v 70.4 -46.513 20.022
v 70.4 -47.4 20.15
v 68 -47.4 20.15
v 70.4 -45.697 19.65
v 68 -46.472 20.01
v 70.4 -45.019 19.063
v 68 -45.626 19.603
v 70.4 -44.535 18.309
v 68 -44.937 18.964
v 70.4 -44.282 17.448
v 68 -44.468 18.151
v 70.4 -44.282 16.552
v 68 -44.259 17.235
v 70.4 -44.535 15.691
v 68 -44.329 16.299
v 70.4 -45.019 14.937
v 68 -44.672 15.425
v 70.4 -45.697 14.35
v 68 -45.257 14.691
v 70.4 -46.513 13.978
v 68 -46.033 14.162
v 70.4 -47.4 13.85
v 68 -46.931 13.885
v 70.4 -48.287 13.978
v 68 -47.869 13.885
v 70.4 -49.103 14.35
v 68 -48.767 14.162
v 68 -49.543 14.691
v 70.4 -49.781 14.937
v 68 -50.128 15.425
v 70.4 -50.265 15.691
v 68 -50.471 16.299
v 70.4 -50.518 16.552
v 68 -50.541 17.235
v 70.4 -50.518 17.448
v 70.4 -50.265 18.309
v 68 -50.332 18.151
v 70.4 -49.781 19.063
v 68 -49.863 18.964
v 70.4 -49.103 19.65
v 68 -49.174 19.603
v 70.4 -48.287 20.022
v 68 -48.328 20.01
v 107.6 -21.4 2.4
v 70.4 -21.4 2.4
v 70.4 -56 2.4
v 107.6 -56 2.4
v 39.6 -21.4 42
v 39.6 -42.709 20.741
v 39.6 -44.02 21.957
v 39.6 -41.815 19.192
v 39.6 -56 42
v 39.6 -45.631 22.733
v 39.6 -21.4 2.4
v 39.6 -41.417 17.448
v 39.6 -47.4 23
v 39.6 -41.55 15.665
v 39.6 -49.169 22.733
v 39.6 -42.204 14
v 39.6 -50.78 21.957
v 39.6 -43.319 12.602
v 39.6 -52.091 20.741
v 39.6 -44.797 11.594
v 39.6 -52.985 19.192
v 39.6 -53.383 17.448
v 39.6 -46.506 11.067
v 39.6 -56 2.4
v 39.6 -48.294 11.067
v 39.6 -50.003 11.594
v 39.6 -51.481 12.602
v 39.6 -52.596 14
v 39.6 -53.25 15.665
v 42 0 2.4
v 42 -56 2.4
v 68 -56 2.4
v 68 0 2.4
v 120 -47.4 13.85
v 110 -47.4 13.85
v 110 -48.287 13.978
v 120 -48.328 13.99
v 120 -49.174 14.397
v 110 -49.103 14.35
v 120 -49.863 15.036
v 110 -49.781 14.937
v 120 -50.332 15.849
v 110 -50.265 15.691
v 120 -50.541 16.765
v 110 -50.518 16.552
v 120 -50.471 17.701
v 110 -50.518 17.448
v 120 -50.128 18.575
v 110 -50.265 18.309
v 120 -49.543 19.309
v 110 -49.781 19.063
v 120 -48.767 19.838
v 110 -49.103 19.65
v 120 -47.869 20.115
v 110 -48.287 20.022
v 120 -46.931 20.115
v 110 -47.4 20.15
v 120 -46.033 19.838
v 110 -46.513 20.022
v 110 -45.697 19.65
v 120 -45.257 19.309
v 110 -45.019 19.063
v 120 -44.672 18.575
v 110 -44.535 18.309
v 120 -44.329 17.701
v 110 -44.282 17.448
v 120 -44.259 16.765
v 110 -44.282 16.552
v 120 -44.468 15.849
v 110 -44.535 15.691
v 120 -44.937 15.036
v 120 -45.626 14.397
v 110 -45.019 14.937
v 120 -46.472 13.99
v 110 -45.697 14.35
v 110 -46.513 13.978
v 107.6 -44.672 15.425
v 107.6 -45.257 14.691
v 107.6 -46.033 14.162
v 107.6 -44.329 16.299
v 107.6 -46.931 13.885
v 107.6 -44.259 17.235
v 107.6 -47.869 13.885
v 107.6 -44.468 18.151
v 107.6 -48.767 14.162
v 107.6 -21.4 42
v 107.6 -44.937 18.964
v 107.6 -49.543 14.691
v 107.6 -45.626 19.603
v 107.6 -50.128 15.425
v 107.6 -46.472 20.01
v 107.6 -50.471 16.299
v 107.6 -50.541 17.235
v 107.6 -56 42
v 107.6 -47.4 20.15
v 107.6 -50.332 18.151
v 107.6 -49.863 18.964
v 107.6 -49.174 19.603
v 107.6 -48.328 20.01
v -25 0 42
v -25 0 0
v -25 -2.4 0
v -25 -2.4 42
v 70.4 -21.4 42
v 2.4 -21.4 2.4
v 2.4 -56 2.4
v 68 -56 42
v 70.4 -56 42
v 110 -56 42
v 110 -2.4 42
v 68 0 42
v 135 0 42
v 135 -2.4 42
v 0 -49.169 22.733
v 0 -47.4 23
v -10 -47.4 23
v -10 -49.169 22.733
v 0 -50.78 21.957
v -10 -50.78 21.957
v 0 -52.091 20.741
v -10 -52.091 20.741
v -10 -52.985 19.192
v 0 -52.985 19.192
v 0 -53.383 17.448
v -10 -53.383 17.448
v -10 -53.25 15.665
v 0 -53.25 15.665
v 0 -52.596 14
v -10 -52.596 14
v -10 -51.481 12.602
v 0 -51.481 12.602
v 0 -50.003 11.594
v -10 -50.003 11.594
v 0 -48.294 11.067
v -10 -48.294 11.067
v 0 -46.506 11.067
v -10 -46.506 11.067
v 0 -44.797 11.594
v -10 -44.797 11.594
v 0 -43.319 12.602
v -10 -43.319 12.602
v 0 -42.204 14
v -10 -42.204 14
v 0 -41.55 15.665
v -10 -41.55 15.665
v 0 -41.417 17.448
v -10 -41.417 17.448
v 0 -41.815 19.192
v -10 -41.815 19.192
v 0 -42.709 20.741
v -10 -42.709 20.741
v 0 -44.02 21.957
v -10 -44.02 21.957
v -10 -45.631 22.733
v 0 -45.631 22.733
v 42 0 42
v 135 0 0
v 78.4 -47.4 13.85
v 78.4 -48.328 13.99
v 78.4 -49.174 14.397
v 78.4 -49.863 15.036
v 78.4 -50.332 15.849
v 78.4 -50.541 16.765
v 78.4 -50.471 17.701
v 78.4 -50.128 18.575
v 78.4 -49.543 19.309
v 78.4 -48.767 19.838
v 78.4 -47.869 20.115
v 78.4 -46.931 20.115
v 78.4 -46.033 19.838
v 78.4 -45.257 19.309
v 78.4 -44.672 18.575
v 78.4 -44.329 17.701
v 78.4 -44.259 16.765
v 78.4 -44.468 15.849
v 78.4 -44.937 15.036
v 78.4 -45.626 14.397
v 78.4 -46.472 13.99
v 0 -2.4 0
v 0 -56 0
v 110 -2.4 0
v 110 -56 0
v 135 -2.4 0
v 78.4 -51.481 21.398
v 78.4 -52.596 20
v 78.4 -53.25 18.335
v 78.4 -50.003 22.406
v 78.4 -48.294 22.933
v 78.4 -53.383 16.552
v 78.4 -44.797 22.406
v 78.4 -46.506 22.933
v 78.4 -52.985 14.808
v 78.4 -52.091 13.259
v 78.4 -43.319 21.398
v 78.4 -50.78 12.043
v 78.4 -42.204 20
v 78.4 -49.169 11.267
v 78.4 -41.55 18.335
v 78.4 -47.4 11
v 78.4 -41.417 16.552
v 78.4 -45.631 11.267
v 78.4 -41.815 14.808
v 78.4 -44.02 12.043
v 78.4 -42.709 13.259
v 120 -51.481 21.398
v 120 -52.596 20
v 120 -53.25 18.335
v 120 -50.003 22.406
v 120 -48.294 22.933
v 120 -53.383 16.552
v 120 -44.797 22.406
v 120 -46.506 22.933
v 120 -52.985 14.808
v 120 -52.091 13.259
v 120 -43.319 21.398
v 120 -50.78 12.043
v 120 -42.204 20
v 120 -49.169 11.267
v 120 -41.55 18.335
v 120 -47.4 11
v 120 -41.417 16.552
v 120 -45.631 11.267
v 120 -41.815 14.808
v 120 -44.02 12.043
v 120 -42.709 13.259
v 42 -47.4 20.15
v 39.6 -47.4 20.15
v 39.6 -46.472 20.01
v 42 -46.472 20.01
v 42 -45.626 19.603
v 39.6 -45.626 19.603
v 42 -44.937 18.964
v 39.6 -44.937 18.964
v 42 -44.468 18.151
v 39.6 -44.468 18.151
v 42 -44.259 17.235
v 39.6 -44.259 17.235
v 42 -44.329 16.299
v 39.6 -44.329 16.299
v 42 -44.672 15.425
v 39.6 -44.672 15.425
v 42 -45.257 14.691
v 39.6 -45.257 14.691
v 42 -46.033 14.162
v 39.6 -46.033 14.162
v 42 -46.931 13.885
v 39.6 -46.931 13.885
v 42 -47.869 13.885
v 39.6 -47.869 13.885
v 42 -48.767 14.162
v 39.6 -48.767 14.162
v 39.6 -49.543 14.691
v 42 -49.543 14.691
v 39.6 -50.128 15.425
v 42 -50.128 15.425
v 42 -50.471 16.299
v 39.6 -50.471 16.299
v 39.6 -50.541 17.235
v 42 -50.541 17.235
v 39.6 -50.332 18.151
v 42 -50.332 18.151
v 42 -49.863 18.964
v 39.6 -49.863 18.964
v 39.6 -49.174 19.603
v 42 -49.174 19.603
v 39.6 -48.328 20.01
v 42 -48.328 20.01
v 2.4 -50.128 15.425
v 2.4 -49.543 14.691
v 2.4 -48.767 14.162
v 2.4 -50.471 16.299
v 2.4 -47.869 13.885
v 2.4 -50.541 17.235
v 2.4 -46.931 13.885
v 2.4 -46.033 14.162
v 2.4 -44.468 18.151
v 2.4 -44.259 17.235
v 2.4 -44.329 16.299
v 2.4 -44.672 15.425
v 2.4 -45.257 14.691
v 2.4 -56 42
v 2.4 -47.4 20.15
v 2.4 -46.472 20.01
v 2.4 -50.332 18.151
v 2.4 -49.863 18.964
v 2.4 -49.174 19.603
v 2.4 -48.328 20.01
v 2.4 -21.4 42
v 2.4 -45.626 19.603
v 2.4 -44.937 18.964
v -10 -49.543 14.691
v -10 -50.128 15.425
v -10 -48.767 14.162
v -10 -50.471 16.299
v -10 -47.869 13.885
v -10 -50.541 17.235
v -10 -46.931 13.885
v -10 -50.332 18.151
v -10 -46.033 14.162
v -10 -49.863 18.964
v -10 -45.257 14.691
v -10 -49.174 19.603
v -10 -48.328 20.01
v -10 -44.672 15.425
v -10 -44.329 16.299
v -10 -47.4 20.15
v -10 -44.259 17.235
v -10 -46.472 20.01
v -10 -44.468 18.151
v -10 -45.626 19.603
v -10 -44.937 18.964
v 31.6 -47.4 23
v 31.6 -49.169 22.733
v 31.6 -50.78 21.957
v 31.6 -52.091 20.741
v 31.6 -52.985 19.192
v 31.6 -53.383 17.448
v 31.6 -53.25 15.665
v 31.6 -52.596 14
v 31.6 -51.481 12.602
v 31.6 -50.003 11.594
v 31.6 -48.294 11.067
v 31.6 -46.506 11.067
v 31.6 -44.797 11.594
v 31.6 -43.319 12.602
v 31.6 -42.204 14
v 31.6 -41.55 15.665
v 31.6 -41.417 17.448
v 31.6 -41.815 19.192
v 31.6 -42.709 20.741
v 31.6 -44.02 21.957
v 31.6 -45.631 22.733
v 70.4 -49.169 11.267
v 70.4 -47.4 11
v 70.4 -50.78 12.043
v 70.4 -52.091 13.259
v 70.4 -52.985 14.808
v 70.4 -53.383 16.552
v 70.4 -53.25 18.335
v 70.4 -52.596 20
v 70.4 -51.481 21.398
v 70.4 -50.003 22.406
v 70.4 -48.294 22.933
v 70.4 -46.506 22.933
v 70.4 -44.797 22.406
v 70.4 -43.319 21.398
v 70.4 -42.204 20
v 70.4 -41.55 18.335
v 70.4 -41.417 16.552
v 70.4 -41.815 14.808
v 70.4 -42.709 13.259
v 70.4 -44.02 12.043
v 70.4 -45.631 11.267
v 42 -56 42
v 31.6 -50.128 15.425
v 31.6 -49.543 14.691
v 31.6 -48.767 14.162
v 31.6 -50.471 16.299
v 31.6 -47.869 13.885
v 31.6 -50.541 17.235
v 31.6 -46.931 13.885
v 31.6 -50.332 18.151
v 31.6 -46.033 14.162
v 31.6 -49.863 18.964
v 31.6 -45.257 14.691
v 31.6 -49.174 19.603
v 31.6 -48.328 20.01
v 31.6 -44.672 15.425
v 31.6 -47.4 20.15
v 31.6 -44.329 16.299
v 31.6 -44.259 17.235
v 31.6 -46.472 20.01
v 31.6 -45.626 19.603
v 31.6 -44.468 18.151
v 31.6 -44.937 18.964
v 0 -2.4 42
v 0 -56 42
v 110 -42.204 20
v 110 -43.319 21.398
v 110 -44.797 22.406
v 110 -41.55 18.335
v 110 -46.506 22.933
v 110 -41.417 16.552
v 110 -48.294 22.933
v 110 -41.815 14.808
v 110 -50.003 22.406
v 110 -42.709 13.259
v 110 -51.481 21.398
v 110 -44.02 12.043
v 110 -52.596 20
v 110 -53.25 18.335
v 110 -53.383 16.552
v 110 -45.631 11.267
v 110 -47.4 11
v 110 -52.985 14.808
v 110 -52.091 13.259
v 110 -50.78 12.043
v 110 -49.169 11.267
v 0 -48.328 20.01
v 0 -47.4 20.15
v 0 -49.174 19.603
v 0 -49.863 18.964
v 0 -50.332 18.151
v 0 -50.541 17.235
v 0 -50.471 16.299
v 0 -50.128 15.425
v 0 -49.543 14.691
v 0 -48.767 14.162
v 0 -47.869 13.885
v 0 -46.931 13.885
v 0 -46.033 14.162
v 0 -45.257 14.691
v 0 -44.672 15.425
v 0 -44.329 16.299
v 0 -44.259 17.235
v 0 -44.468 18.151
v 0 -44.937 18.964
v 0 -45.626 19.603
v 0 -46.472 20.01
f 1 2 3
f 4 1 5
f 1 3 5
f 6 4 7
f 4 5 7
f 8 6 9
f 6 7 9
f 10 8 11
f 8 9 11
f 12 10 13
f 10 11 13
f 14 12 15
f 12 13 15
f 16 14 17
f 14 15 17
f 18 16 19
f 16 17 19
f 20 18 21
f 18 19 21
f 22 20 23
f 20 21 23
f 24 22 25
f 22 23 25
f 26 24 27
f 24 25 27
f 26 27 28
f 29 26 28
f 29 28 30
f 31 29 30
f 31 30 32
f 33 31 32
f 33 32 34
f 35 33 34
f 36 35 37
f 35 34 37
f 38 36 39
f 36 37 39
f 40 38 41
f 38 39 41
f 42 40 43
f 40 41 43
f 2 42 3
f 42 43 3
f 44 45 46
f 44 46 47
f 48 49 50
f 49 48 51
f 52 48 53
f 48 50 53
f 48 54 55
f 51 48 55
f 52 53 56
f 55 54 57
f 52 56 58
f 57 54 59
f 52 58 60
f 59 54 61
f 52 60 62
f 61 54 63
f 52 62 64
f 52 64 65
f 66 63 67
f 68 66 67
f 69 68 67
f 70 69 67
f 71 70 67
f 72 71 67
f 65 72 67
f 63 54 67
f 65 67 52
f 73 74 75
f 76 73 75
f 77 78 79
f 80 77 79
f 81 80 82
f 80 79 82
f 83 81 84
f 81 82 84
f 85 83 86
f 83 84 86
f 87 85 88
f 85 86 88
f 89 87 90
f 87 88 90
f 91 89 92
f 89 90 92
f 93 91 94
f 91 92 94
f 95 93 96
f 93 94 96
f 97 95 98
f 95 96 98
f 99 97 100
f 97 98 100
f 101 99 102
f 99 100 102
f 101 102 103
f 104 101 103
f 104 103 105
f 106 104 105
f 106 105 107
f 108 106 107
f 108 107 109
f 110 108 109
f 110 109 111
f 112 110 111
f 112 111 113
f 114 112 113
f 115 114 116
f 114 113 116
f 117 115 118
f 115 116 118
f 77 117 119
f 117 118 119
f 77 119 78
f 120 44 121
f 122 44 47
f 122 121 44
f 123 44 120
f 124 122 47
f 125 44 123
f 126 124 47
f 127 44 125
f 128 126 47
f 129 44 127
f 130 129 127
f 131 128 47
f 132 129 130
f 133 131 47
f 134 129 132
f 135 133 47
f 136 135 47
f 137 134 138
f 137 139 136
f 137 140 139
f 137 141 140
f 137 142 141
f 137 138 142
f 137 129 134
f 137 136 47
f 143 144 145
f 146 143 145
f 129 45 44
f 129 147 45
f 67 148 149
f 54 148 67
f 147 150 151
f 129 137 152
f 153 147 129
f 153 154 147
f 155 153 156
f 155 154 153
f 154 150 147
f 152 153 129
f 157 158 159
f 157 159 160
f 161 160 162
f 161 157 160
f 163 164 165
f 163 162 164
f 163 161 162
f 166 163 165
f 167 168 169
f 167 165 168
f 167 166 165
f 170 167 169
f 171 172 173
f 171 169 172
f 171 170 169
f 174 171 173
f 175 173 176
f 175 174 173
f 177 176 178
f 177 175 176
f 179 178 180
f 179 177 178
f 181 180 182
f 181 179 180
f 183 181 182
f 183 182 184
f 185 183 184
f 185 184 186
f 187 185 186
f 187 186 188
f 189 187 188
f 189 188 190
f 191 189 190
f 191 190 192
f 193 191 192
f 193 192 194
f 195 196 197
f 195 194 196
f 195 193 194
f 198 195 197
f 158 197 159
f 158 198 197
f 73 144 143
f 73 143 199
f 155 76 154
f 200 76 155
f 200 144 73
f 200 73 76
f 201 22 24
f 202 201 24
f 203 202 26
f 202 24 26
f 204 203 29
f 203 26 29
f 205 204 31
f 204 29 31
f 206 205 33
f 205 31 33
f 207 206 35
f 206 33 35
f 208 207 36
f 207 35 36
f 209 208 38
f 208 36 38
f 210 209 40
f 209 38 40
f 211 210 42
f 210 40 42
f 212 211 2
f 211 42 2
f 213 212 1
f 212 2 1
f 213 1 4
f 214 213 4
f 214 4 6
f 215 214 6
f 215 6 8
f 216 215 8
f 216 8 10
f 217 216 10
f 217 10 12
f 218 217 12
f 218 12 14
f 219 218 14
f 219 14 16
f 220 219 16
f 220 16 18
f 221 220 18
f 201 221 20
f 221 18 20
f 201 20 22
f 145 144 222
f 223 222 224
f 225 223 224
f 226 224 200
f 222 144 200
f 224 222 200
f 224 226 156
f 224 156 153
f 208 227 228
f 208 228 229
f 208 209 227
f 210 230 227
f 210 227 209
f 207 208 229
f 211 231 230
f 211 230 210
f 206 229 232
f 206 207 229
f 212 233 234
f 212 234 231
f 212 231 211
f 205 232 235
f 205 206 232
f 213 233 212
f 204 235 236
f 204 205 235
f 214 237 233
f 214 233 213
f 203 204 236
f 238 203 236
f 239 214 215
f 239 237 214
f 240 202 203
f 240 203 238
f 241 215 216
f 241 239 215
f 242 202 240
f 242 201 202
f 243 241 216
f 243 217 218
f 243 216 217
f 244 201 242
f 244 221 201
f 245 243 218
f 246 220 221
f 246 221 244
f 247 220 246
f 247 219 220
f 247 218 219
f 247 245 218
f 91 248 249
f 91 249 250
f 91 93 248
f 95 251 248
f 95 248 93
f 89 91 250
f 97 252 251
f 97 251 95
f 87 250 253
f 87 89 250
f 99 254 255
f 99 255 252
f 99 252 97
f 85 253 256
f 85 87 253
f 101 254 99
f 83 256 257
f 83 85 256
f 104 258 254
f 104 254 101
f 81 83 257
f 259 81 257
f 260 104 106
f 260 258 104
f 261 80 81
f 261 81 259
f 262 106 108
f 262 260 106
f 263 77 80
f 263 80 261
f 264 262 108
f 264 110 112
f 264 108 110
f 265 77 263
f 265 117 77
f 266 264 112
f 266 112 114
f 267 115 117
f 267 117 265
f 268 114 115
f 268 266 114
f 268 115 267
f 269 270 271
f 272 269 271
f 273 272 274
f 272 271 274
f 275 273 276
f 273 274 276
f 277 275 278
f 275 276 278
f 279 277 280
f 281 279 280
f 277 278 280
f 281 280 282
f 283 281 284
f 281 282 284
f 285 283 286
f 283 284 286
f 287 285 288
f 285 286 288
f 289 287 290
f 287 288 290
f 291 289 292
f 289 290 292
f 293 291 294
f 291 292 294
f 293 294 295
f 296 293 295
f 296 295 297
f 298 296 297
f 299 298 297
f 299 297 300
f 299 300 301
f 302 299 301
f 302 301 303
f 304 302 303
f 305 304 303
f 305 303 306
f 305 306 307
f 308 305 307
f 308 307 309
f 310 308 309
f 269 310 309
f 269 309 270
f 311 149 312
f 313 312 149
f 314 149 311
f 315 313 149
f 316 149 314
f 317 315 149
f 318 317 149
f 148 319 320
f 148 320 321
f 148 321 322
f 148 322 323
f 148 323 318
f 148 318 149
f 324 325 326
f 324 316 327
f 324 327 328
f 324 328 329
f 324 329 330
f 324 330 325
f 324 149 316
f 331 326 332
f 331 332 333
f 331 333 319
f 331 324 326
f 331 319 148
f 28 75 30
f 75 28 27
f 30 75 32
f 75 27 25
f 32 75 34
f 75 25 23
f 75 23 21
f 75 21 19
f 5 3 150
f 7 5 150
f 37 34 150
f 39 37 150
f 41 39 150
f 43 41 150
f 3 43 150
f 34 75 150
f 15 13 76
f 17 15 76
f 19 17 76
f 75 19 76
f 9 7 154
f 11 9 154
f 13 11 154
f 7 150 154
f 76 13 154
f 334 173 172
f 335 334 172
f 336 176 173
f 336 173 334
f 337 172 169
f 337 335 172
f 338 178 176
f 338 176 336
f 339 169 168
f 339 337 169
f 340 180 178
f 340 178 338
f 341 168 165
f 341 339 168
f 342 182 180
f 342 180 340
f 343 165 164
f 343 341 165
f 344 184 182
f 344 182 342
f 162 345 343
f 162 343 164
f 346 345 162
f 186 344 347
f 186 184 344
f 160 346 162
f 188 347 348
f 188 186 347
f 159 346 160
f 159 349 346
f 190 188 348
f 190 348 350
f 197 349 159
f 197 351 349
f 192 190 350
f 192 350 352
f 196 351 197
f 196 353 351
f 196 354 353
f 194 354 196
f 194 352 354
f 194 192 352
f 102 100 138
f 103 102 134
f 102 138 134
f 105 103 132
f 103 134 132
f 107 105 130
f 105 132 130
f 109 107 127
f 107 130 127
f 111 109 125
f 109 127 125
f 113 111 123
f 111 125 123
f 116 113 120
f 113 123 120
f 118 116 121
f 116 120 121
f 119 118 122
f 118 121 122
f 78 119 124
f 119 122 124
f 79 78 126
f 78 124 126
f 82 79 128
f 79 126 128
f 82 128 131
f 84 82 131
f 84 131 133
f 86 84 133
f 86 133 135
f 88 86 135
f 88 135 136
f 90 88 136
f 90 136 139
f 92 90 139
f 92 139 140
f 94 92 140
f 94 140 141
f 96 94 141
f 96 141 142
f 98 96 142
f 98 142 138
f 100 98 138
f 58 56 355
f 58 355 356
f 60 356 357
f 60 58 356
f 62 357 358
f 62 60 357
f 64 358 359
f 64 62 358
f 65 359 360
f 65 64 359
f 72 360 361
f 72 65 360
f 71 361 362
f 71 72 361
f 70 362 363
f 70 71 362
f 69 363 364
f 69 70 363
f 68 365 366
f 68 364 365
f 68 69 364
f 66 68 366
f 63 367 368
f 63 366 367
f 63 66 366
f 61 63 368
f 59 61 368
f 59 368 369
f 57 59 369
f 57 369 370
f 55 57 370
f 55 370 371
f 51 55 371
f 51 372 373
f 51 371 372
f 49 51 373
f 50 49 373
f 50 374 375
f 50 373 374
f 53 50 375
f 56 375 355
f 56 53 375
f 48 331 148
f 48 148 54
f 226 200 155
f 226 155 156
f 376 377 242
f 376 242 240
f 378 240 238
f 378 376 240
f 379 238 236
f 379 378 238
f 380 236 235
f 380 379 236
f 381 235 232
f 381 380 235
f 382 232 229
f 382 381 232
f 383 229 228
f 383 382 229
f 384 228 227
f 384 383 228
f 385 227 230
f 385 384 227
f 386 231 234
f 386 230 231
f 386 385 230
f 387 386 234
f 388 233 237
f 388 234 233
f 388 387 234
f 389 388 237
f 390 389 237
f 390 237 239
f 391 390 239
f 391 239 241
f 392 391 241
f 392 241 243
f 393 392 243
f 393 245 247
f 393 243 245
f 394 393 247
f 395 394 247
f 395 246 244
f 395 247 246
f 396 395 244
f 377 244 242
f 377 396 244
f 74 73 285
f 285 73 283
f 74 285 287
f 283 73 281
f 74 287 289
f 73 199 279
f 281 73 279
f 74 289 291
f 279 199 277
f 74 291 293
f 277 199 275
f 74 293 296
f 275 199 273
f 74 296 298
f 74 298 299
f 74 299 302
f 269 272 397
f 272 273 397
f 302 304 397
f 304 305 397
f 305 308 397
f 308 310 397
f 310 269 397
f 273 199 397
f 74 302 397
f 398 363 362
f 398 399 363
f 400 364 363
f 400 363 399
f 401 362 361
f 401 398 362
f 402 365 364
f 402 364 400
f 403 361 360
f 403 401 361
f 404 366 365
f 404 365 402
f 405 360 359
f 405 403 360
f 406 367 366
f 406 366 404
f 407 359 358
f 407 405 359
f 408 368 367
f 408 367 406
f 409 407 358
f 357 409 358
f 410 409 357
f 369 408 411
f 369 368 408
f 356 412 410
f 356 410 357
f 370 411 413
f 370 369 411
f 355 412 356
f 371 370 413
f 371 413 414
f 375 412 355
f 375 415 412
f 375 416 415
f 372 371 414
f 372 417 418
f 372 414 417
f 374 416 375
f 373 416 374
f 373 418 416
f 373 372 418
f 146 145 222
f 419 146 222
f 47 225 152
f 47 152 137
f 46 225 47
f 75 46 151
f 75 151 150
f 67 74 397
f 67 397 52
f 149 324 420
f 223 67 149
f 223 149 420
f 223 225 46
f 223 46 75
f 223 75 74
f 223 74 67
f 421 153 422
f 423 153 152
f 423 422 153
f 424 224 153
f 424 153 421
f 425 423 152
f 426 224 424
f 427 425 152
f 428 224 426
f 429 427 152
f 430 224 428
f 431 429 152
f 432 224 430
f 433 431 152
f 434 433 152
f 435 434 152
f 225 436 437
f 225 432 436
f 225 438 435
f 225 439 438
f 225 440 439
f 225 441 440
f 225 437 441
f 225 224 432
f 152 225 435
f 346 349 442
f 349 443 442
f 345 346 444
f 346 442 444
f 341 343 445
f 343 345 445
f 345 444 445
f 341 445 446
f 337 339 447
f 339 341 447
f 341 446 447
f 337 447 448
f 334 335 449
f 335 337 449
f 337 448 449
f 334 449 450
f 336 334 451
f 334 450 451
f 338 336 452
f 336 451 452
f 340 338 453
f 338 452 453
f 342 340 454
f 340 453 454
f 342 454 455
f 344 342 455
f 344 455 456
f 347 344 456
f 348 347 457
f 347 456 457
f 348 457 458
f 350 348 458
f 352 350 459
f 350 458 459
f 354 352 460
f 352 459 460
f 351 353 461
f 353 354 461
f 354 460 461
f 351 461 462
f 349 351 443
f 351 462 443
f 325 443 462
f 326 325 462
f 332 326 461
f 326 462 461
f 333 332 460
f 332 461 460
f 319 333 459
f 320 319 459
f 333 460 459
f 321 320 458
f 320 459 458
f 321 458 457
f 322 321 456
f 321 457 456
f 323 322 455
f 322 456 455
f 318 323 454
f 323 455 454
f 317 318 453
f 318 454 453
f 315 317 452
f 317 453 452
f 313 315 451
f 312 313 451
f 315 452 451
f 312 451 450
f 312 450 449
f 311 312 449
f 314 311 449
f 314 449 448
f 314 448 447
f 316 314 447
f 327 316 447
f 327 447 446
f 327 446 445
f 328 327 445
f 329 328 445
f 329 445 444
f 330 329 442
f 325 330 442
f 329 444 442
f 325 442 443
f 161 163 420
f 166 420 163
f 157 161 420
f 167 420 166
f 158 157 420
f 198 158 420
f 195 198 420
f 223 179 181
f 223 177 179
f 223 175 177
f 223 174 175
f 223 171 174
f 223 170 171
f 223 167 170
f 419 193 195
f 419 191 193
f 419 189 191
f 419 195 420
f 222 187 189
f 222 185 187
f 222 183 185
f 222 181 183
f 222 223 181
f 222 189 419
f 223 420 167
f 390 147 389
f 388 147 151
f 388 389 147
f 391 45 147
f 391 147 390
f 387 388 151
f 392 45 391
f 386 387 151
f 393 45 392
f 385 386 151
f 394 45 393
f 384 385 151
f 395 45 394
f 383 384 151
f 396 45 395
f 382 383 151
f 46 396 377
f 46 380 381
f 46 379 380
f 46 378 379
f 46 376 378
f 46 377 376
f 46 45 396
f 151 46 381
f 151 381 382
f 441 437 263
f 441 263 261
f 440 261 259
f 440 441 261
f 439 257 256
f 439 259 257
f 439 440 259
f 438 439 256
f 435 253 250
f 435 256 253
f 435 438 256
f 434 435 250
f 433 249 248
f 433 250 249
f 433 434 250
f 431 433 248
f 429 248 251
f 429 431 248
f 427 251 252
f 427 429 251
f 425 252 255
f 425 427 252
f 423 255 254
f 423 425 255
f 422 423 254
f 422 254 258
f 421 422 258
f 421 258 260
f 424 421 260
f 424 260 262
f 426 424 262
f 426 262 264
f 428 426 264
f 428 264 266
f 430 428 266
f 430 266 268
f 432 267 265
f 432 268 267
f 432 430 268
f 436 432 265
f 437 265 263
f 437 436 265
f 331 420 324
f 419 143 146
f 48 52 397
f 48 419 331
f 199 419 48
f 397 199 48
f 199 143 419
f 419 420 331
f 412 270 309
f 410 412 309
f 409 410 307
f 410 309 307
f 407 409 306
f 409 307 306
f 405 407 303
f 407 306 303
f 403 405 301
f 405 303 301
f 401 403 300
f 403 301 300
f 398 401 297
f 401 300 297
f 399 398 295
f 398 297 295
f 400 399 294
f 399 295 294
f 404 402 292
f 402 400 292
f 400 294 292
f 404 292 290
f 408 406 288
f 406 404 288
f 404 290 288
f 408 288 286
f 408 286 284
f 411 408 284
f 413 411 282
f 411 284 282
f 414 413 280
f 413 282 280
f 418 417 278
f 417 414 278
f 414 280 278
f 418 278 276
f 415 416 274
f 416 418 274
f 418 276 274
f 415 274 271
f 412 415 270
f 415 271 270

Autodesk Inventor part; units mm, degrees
ref_plane "YZ Plane" through (0, 0, 0) normal (1, 0, 0) x (0, 1, 0)
ref_plane "XZ Plane" through (0, 0, 0) normal (0, 1, 0) x (-1, 0, 0)
ref_plane "XY Plane" through (0, 0, 0) normal (0, 0, 1) x (1, 0, 0)
sketch "Sketch1" plane through (0, 0, 0) normal (0, 0, 1) x (1, 0, 0)
  line L0 (0, 0) -> (110, 0)
  line L1 (110, 0) -> (110, -56)
  line L2 (110, -56) -> (0, -56)
  line L3 (0, -56) -> (0, 0)
  line L4 (0, 0) -> (-25, 0)
  line L5 (-25, 0) -> (-25, -2.4)
  line L6 (-25, -2.4) -> (0, -2.4)
  line L7 (0, -2.4) -> (0, 0)
  line L8 (110, 0) -> (135, 0)
  line L9 (135, 0) -> (135, -2.4)
  line L10 (135, -2.4) -> (110, -2.4)
  line L11 (110, -2.4) -> (110, 0)
  dimension "d0" = 110
  dimension "d1" = 56
  dimension "d2" = 25
  dimension "d3" = 2.4
  dimension "d4" = 25
  dimension "d5" = 2.4
extrude "Extrusion1" add sketch "Sketch1" along normal blind 42
sketch "Sketch2" plane through (0, 0, 42) normal (0, 0, 1) x (1, 0, 0)
  line L0 (2.4, -2.4) -> (107.6, -2.4)
  line L1 (107.6, -2.4) -> (107.6, -54.7735)
  line L2 (2.4, -54.7735) -> (2.4, -2.4)
  line L3 (110, -56) -> (110, -2.4) projected
  line L4 (0, -2.4) -> (0, -56) projected
  line L5 (107.6, -54.7735) -> (107.6, -56)
  line L6 (2.4, -54.7735) -> (2.4, -56)
  line L7 (0, -56) -> (110, -56) projected
  point P0 (0, 0)
  dimension "d8" = 2.4
  dimension "d9" = 2.4
extrude "Extrusion2" cut sketch "Sketch2" against normal blind 39.6
sketch "Sketch3" plane through (0, 0, 42) normal (0, 0, 1) x (1, 0, 0)
  line L0 (135, 0) -> (-25, 0) projected
  line L1 (55, 0) -> (68, 0)
  line L2 (55, 0) -> (42, 0)
  line L3 (42, 0) -> (42, -2.4)
  line L4 (2.4, -2.4) -> (107.6, -2.4) projected
  line L5 (68, -2.4) -> (42, -2.4)
  line L6 (68, -2.4) -> (68, 0)
  point P0 (0, 0)
  dimension "d12" = 13
  dimension "d13" = 13
extrude "Extrusion3" cut sketch "Sketch3" against normal blind 39.6
sketch "Sketch4" plane through (0, 0, 2.4) normal (0, 0, 1) x (1, 0, 0)
  line L0 (2.4, -2.4) -> (42, -2.4) projected
  line L1 (107.6, -56) -> (2.4, -56) projected
  line L2 (42, -2.4) -> (39.6, -2.4)
  line L3 (39.6, -2.4) -> (39.6, -56)
  line L4 (39.6, -56) -> (42, -56)
  line L5 (42, -56) -> (42, -2.4)
  line L6 (68, -2.4) -> (107.6, -2.4) projected
  line L7 (68, -2.4) -> (70.4, -2.4)
  line L8 (70.4, -2.4) -> (70.4, -56)
  line L9 (70.4, -56) -> (68, -56)
  line L10 (68, -56) -> (68, -2.4)
  point P0 (0, 0)
  dimension "d16" = 2.4
  dimension "d17" = 2.4
extrude "Extrusion4" add sketch "Sketch4" along normal blind 39.6
sketch "Sketch5" plane through (-25, -2.4, 0) normal (0, -1, 0) x (1, 0, 0)
  circle A0 centre (12.5, 30) radius 1.5
  circle A1 centre (12.5, 12) radius 1.5
  line L0 (0, 42) -> (25, 42) projected
  line L1 (0, 0) -> (25, 0) projected
  dimension "d20" = 3
  dimension "d21" = 3
  dimension "d22" = 12
  dimension "d23" = 12
sketch "Sketch6" plane through (2.4, -2.4, 2.4) normal (0, -1, 0) x (1, 0, 0)
  line L0 (37.2, 0) -> (37.2, 39.6) projected
  line L1 (0, 39.6) -> (37.2, 39.6)
  line L2 (37.2, 39.6) -> (37.2, 0)
  line L3 (37.2, 0) -> (0, 0)
  line L4 (0, 0) -> (0, 39.6)
  line L5 (68, 39.6) -> (68, 0) projected
  line L6 (105.2, 39.6) -> (105.2, 0) projected
  line L7 (68, 39.6) -> (105.2, 39.6)
  line L8 (105.2, 39.6) -> (105.2, 0)
  line L9 (105.2, 0) -> (68, 0)
  line L10 (68, 0) -> (68, 39.6)
  point P0 (-2.4, -2.4)
extrude "Extrusion5" add sketch "Sketch6" along normal blind 19
sketch "Sketch7" plane through (0, -56, 0) normal (-1, 0, 0) x (0, 0, 1)
  circle A0 centre (17, 8.6) radius 3.15
  line L0 (0, 53.6) -> (0, 0) projected
  line L1 (0, 53.6) -> (42, 53.6) projected
  point P0 (0, 56)
  dimension "d26" = 6.3
  dimension "d27" = 17
  dimension "d28" = 45
extrude "Extrusion6" cut sketch "Sketch7" against normal blind 110
sketch "Sketch8" plane through (0, -56, 0) normal (-1, 0, 0) x (0, 0, 1)
  circle A0 centre (17, 8.6) radius 3.15 projected
  circle A1 centre (17, 8.6) radius 6
  point P0 (0, 56)
  dimension "d31" = 12
extrude "Extrusion7" add sketch "Sketch8" along normal blind 10
sketch "Sketch9" plane through (39.6, -56, 2.4) normal (-1, 0, 0) x (0, 0, 1)
  circle A0 centre (14.6, 8.6) radius 3.15 projected
  circle A1 centre (14.6, 8.6) radius 6
  point P0 (-2.4, 56)
  dimension "d34" = 12
extrude "Extrusion8" add sketch "Sketch9" along normal blind 8
sketch "Sketch10" plane through (110, -56, 0) normal (1, 0, 0) x (0, 0, -1)
  circle A0 centre (-17, 8.6) radius 3.15 projected
  circle A1 centre (-17, 8.6) radius 6
  point P0 (0, 56)
  dimension "d37" = 12
extrude "Extrusion9" add sketch "Sketch10" along normal blind 10
sketch "Sketch11" plane through (70.4, -56, 42) normal (1, 0, 0) x (0, 0, -1)
  circle A0 centre (25, 8.6) radius 3.15 projected
  circle A1 centre (25, 8.6) radius 6
  point P0 (42, 56)
  dimension "d40" = 12
extrude "Extrusion10" add sketch "Sketch11" along normal blind 8
sketch "Sketch12" plane through (2.4, -21.4, 2.4) normal (0, -1, 0) x (1, 0, 0)
  circle A0 centre (22.2, 14.6) radius 13.25
  circle A1 centre (83, 14.6) radius 13.25
  line L0 (68, 0) -> (68, 39.6) projected
  line L1 (37.2, 0) -> (37.2, 39.6) projected
  line L2 (37.2, 39.6) -> (0, 39.6) projected
  line L3 (105.2, 39.6) -> (68, 39.6) projected
  point P0 (-2.4, -2.4)
  dimension "d43" = 26.5
  dimension "d44" = 26.5
  dimension "d45" = 15
  dimension "d46" = 15
  dimension "d47" = 25
  dimension "d48" = 25
properties part number "Chassi_Rear"
